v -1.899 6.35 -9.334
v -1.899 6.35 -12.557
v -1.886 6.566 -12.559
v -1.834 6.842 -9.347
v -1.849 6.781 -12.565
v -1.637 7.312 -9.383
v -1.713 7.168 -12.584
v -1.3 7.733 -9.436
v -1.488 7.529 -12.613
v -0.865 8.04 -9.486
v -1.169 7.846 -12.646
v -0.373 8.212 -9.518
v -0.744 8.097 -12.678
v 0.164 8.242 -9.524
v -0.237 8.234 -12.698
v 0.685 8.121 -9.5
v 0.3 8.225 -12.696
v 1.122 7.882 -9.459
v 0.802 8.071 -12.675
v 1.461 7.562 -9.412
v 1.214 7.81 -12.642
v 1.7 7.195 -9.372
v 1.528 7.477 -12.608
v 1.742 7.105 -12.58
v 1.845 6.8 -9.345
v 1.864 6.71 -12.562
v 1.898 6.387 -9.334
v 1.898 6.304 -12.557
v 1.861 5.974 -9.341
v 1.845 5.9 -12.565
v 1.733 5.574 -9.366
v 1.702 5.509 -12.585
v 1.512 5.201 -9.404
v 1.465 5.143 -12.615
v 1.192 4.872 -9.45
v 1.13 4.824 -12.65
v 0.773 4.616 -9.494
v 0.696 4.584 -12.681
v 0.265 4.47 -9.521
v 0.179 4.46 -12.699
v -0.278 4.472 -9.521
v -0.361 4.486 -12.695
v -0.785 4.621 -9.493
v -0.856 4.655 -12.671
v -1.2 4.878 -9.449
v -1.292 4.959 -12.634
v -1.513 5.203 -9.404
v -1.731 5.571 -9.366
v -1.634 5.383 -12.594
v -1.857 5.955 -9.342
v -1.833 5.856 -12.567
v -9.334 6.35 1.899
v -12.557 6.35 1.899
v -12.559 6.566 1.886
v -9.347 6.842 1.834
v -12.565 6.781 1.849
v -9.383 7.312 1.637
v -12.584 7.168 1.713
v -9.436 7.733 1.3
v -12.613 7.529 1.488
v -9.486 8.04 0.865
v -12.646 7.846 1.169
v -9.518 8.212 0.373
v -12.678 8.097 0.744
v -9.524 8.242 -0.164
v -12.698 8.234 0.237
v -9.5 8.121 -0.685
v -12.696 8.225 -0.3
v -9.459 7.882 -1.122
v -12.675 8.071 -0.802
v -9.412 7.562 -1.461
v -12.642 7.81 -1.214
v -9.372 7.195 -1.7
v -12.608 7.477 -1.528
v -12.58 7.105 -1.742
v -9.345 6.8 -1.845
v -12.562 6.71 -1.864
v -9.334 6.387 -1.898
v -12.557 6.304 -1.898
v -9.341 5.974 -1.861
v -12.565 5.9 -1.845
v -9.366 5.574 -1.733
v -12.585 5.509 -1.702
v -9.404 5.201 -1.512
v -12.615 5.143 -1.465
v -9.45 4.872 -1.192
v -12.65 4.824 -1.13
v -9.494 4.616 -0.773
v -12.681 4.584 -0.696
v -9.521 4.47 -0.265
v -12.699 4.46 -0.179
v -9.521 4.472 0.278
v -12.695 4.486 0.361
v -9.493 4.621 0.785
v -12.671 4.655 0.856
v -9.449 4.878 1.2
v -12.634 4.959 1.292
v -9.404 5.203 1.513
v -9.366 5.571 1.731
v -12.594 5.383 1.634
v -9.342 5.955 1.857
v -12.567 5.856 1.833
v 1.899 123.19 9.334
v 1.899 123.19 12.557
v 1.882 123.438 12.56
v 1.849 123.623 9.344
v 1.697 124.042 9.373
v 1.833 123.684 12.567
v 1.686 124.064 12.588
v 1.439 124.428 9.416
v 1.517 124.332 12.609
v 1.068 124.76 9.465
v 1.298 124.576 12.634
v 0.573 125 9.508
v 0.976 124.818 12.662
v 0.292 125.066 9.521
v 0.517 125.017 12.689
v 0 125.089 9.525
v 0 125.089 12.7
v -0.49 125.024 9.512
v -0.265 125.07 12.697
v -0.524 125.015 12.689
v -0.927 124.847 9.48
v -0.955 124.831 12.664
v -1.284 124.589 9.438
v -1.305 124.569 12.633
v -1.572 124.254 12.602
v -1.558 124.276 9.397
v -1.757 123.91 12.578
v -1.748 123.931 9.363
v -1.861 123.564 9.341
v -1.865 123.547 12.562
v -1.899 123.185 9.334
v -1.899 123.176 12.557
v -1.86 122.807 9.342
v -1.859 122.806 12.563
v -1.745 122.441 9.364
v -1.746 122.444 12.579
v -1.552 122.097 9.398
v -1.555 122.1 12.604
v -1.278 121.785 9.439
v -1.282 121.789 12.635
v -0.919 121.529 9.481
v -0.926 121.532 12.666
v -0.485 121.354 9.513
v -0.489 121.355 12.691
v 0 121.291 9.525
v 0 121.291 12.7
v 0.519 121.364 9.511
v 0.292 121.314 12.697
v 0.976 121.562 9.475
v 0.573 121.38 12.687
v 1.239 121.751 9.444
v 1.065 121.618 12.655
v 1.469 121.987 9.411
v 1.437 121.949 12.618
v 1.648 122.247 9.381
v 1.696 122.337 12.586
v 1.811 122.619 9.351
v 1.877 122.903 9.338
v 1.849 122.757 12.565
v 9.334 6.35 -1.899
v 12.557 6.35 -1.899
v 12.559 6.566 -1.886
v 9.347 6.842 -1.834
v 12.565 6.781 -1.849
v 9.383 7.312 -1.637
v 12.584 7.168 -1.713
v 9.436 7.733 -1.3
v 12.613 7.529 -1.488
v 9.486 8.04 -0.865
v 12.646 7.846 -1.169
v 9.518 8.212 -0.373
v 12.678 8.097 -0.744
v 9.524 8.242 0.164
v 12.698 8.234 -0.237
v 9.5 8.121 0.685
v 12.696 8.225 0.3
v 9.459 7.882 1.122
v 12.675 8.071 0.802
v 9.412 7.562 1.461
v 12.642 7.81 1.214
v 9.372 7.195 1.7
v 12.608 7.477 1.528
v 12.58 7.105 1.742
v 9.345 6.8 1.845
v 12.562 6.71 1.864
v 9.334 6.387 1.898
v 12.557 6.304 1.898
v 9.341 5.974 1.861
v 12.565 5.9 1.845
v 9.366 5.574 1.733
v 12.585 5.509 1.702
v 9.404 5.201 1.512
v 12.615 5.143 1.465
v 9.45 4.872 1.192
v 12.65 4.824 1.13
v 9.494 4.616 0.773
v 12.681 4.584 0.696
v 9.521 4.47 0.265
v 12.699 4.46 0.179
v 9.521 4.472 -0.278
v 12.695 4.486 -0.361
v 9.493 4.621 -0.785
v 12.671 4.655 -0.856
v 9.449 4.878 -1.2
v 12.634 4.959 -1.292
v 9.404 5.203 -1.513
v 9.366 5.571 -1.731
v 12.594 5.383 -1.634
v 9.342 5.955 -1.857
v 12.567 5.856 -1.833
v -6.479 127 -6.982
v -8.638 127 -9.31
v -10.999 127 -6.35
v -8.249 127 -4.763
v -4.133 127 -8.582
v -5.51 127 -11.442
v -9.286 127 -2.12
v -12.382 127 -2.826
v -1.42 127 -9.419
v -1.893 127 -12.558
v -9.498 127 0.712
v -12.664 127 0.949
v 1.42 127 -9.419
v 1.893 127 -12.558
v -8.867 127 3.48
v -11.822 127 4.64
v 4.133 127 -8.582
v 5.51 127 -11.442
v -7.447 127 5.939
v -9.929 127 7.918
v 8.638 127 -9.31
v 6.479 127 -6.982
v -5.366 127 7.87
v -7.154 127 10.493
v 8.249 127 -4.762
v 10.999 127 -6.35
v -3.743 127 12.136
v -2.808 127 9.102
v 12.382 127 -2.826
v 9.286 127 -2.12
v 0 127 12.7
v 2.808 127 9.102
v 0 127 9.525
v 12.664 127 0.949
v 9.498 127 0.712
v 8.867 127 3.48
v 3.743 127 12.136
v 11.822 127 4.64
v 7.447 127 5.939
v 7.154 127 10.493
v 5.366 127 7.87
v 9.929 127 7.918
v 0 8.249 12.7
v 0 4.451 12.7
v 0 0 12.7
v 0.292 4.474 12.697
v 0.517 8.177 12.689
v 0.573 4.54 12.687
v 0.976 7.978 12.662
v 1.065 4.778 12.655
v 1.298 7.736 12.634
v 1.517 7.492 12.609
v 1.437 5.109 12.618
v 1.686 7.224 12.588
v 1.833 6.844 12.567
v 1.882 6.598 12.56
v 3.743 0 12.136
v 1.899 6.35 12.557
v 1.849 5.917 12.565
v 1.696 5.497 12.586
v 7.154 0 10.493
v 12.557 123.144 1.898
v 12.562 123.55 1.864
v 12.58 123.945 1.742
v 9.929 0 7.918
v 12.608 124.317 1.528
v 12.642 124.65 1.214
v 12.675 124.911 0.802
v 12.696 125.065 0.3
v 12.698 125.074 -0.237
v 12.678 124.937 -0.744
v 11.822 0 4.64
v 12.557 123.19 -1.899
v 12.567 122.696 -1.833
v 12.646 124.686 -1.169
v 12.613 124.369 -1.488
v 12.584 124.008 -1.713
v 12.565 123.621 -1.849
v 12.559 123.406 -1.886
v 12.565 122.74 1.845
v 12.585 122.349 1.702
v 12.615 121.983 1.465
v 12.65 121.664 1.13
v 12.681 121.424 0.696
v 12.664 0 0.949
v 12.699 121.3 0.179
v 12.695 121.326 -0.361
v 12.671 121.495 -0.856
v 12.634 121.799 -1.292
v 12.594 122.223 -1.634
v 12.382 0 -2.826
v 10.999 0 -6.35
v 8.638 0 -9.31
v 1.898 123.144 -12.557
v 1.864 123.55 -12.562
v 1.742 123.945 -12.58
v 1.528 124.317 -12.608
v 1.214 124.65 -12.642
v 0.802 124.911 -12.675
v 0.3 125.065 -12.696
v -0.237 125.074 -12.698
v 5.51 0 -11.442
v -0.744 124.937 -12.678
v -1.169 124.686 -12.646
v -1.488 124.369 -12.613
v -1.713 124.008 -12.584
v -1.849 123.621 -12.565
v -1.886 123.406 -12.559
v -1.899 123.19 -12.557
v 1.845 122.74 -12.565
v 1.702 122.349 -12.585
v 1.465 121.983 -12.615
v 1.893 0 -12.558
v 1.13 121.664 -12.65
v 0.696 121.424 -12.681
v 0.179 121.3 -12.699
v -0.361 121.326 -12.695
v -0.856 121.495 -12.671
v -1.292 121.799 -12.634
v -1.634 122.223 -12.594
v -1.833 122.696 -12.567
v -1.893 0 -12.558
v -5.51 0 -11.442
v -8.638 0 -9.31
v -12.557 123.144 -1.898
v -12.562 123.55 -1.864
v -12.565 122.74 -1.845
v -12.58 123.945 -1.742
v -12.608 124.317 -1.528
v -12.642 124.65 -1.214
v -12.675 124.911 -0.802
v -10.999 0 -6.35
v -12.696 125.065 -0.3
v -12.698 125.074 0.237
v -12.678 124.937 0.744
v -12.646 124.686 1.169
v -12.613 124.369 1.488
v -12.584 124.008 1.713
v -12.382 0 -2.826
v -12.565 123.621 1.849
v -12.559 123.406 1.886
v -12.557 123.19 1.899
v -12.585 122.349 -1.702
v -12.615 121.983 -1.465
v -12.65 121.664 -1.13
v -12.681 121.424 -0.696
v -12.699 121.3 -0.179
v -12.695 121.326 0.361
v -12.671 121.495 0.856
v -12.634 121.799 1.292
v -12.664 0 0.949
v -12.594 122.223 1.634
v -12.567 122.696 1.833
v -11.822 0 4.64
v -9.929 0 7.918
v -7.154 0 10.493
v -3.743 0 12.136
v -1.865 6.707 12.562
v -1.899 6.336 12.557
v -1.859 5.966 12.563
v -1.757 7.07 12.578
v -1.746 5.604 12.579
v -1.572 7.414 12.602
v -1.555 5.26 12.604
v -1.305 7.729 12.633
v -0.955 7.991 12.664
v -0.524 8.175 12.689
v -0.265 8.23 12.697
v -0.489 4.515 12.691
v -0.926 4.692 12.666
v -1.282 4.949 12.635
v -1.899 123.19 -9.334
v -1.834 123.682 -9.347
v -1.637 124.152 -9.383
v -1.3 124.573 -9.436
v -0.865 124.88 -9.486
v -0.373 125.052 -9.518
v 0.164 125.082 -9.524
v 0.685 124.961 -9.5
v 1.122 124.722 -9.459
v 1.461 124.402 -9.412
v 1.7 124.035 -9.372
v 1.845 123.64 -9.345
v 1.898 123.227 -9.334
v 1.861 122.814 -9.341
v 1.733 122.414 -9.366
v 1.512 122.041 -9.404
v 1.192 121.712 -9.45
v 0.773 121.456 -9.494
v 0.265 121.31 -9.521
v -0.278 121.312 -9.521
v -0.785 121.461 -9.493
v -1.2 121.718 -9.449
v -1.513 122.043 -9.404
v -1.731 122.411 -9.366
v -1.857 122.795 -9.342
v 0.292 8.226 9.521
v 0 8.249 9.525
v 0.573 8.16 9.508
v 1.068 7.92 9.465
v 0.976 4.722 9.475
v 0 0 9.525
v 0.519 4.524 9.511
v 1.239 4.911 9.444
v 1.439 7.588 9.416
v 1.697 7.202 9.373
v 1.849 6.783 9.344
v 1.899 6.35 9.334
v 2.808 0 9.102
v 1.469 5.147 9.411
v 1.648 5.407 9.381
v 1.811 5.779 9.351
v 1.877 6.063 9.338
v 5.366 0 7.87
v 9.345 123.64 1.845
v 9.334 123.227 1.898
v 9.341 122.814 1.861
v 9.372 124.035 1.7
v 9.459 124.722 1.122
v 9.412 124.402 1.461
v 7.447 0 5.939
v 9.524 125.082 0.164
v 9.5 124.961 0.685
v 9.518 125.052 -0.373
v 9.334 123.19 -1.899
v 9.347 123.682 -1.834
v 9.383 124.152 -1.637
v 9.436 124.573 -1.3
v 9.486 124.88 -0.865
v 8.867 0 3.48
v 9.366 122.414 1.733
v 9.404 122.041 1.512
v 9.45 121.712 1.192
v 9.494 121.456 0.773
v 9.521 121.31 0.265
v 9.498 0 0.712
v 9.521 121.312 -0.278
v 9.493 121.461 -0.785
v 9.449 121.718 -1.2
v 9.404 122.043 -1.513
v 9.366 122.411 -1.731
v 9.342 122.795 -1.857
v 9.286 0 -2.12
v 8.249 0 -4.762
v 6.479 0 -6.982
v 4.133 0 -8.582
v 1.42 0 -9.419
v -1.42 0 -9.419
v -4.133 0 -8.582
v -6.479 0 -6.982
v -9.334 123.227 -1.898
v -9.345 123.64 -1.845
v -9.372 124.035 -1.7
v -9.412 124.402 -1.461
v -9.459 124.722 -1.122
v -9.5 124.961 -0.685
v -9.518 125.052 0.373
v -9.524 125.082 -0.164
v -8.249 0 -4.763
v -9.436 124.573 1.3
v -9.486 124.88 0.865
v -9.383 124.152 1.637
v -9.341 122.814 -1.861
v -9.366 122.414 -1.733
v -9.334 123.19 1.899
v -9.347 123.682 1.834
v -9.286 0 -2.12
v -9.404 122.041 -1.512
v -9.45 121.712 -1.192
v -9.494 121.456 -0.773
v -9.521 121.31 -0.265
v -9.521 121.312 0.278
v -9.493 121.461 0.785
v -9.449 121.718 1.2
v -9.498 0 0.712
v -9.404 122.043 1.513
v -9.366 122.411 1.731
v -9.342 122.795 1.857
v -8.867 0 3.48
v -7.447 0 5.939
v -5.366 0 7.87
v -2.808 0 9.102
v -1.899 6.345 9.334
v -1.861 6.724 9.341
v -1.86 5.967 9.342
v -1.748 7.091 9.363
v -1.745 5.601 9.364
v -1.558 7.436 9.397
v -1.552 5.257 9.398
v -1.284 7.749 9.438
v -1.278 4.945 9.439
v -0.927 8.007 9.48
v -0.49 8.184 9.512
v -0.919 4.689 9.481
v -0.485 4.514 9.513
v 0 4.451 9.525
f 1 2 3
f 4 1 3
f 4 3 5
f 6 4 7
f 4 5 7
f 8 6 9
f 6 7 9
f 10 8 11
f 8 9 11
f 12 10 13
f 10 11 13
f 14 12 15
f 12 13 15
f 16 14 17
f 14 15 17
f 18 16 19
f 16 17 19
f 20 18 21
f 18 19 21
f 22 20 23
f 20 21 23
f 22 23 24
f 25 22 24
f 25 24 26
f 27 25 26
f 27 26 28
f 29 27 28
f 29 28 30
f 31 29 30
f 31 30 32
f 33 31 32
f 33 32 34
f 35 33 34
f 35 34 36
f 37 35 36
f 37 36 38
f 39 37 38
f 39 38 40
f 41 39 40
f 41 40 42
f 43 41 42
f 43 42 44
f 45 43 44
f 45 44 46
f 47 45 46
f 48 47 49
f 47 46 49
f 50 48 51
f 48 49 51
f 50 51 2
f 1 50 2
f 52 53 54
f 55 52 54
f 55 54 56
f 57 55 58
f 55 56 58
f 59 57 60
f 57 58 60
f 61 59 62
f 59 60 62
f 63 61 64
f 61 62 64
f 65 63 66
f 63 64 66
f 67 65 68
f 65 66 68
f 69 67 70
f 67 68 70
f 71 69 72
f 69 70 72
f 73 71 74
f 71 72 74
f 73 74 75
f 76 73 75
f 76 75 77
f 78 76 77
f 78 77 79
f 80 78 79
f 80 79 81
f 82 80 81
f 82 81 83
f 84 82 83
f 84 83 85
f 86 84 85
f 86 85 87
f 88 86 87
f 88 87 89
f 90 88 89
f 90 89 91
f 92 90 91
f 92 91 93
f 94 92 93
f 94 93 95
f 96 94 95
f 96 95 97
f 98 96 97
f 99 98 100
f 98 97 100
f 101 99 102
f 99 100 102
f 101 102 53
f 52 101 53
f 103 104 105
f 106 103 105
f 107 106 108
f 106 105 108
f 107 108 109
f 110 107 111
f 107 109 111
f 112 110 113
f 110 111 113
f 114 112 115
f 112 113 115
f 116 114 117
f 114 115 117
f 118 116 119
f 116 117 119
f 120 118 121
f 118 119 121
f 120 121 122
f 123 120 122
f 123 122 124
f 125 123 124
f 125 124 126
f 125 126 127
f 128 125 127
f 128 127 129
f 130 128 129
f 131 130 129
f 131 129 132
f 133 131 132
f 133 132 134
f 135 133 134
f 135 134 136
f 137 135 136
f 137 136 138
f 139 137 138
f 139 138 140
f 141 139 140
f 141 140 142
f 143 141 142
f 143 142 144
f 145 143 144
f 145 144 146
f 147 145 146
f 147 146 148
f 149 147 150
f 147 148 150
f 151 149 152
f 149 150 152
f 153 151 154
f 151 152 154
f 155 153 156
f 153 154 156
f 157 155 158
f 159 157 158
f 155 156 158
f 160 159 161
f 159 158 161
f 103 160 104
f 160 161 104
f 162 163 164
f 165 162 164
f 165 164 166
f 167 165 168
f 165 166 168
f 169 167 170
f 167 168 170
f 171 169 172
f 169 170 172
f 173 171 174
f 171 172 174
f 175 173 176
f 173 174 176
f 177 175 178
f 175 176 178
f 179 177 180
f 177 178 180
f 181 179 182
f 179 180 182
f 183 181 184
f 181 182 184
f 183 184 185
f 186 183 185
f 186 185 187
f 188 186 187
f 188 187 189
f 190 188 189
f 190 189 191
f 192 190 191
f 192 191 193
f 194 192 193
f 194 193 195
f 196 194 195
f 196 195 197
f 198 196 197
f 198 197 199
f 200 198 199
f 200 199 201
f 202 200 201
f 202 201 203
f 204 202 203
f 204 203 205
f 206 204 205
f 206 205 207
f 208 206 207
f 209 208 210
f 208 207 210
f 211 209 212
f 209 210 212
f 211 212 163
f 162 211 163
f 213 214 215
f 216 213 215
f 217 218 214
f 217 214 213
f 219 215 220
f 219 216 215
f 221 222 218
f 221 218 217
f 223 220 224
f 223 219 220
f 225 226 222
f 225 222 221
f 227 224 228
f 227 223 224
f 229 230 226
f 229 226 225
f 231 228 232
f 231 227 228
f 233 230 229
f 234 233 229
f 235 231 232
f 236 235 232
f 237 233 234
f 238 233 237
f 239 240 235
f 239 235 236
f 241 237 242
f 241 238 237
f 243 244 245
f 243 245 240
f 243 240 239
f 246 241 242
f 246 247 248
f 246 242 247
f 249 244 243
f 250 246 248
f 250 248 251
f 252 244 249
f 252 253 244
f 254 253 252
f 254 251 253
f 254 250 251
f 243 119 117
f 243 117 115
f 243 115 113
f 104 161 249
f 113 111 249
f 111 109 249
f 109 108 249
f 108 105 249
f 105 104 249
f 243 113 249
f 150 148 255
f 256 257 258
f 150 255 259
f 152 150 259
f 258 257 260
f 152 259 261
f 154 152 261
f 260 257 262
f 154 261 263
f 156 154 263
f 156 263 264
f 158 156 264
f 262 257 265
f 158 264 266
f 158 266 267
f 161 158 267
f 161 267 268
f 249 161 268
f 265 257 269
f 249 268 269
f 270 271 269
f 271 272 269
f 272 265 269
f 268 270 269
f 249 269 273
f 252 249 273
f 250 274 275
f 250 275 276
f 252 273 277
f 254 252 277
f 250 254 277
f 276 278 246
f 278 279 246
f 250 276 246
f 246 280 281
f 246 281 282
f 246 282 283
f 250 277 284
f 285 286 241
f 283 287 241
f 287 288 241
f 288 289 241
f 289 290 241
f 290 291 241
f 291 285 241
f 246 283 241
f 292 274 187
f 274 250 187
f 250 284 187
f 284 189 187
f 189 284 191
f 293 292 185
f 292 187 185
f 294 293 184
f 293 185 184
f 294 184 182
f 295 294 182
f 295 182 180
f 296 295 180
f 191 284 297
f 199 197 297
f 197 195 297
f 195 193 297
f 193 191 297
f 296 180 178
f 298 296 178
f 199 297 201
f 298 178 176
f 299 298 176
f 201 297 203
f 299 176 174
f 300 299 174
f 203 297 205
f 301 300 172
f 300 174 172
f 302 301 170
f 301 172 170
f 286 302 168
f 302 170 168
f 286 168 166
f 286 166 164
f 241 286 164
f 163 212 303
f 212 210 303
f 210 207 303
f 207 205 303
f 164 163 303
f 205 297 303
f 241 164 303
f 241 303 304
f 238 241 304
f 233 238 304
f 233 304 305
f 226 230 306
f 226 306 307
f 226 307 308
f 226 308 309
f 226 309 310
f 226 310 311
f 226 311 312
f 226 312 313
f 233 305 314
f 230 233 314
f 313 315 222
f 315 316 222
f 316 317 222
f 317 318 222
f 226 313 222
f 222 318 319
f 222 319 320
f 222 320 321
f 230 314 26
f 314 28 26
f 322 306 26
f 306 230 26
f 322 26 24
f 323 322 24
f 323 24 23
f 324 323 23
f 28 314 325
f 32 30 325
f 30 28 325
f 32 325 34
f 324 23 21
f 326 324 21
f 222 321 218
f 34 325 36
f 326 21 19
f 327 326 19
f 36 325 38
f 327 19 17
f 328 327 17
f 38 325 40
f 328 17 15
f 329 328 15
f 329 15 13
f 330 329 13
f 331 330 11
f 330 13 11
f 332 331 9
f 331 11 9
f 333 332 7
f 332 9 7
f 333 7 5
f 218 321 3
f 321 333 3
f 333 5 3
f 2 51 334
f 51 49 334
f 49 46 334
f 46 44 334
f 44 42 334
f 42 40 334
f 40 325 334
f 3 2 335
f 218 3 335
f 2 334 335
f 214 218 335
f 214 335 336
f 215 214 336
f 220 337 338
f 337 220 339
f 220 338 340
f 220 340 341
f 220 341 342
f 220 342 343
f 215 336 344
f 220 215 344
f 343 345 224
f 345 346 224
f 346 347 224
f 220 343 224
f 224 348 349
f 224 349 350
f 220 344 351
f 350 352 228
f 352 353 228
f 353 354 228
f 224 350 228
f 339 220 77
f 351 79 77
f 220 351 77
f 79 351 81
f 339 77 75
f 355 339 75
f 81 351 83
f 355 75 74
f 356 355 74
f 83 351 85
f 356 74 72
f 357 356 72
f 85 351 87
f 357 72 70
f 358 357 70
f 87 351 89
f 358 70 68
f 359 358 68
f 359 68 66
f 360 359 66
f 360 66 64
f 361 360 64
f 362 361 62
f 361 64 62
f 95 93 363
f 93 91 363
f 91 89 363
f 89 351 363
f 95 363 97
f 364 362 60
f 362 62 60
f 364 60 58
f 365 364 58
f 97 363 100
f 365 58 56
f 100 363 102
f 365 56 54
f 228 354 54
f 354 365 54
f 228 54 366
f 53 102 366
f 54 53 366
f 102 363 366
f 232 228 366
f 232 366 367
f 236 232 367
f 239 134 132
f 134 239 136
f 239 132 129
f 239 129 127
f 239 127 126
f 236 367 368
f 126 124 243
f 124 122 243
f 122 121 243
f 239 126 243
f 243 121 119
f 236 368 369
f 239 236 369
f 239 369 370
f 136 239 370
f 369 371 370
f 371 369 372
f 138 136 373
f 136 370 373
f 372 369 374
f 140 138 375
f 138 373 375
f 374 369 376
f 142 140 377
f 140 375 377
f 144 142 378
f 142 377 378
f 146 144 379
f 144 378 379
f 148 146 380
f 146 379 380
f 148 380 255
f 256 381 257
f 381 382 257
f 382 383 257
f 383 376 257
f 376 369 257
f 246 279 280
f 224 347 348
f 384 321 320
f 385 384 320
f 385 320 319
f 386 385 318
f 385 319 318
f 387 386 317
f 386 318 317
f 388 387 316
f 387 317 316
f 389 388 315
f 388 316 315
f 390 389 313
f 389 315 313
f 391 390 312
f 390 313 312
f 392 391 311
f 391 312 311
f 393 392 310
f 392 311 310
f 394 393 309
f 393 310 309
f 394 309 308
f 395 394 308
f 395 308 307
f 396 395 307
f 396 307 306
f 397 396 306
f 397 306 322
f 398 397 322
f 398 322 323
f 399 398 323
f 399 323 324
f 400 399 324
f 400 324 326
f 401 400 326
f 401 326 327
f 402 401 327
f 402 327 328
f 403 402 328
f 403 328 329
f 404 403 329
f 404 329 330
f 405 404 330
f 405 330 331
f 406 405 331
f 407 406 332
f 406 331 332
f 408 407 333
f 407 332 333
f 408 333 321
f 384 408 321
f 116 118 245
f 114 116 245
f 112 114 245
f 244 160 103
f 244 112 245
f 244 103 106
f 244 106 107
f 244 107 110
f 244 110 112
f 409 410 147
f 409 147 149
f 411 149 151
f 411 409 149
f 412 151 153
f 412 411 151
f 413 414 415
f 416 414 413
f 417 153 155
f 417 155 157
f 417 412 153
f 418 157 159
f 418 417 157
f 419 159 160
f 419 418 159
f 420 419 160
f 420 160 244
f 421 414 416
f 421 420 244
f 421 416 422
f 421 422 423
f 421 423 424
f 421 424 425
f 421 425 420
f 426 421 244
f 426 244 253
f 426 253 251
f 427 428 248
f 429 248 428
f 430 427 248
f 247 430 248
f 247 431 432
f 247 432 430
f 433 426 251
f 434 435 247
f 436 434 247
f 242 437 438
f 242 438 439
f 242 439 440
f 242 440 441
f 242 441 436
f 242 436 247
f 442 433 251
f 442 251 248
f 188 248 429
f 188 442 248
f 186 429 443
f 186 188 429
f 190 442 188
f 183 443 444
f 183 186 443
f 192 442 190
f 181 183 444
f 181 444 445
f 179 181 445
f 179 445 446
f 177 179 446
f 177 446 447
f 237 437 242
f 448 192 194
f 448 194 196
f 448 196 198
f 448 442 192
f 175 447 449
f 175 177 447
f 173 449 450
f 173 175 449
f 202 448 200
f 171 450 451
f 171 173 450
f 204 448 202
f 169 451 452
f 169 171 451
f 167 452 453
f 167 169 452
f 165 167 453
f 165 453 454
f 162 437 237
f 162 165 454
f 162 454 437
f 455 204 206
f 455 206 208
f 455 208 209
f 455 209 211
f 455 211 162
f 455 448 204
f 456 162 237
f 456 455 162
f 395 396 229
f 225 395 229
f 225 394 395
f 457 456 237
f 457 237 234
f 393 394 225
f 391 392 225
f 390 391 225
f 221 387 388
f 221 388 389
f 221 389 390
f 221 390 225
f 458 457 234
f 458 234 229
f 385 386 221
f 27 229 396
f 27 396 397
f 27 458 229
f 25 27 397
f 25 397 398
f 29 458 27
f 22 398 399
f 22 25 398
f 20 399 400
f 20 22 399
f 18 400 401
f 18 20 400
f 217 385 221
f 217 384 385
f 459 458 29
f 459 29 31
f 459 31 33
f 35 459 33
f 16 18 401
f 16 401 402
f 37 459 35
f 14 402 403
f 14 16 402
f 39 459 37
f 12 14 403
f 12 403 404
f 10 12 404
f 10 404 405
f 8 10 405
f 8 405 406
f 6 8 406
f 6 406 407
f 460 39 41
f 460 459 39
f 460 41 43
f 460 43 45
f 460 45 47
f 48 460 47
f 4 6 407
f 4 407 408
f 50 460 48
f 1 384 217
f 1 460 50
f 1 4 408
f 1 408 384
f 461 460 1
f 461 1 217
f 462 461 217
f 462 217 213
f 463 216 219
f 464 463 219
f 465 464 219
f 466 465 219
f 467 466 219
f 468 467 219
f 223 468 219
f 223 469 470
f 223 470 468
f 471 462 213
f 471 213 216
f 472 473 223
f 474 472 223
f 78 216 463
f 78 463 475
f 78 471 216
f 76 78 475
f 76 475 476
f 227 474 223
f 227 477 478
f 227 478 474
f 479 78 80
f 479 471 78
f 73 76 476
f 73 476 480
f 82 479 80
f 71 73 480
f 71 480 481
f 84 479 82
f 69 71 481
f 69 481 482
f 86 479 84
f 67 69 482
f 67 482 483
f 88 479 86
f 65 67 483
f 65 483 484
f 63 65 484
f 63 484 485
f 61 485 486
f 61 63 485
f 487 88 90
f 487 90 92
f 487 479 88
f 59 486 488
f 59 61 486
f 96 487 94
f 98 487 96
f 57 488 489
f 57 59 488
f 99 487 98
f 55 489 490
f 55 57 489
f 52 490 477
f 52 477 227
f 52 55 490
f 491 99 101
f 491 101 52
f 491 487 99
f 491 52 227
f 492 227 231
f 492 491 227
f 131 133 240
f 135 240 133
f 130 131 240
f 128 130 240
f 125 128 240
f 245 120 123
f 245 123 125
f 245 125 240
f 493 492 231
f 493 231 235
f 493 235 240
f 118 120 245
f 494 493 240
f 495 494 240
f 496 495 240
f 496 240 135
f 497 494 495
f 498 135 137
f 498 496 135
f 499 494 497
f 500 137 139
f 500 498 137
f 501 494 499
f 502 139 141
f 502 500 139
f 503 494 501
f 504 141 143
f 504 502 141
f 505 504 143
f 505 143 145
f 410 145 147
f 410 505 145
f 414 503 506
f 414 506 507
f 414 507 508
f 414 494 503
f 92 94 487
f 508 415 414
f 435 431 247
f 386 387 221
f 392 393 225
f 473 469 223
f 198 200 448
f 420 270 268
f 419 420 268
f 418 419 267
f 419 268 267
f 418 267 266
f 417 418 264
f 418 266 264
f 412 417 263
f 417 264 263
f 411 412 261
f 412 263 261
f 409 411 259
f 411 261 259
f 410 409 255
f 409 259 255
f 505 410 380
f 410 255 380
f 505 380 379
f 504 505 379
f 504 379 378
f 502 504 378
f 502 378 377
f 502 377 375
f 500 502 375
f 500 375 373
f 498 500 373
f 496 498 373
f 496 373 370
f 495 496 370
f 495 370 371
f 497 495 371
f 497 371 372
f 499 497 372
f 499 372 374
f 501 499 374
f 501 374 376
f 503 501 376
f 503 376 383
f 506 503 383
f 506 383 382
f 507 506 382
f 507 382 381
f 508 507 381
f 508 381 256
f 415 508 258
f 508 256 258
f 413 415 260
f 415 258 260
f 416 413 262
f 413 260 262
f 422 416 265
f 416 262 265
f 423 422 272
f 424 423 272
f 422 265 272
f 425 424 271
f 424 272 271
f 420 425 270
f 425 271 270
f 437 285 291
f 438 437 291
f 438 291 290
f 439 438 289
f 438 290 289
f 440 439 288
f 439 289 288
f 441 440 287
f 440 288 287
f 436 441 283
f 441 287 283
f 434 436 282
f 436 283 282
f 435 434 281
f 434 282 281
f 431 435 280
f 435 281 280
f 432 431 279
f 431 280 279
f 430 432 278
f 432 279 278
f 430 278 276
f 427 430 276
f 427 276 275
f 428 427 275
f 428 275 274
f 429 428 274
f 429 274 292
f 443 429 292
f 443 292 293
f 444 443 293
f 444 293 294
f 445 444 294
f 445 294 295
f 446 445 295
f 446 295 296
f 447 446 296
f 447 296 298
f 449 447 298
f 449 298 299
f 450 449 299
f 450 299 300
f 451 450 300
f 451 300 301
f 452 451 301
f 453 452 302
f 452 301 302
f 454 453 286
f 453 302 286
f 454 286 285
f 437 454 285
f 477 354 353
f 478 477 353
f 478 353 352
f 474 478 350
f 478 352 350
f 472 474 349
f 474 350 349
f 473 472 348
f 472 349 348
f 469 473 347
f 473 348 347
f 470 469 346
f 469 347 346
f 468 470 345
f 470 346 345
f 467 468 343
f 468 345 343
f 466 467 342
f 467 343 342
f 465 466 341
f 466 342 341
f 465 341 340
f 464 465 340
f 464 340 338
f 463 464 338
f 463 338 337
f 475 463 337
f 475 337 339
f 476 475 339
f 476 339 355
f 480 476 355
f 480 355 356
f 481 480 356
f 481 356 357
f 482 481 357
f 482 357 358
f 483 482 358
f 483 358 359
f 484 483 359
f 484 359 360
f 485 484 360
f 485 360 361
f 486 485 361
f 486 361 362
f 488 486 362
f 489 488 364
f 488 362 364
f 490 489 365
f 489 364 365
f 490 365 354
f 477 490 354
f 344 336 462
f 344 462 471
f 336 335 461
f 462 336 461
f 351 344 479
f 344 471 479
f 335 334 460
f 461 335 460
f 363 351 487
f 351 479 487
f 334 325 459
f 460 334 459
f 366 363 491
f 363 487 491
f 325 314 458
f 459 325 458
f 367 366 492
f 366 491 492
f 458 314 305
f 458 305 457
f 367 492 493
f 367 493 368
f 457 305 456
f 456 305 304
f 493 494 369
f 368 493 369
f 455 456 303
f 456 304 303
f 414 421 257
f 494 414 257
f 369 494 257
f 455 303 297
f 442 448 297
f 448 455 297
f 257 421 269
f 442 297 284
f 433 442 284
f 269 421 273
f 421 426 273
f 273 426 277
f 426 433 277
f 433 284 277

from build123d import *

# Parameters (mm, degrees)
SKETCH1_R         = 12.7
SKETCH1_R_2       = 9.525
ELTUBO_DEPTH      = 127
SETSCREW_REACH    = 132.136
SETSCREW_BORE_R   = 1.89865
CIRPATTERN1_COUNT = 4


with BuildPart() as part:
    # Sketch1 → ElTubo (new body)
    with BuildSketch(Plane(origin=(0, 0, 0), x_dir=(1, 0, 0), z_dir=(0, 1, 0))):
        with Locations(Location((0, 0, 0), (0, 0, 270))):
            Circle(SKETCH1_R)
        with Locations(Location((0, 0, 0), (0, 0, 270))):
            Circle(SKETCH1_R_2, mode=Mode.SUBTRACT)
    extrude(amount=ELTUBO_DEPTH)

    # SetScrew bore → SetScrew (cut, up to next)
    with BuildSketch(Plane.ZY.offset(12.7), mode=Mode.PRIVATE) as setscrew_sk1:
        with Locations((0, 6.35)):
            Circle(SETSCREW_BORE_R)
    setscrew_tool1 = extrude(setscrew_sk1.sketch, amount=-SETSCREW_REACH, mode=Mode.PRIVATE) & part.part
    # SetScrew bore → SetScrew (cut, up to next)
    with BuildSketch(Plane.ZY.offset(12.7), mode=Mode.PRIVATE) as setscrew_sk2:
        with Locations((0, 123.19)):
            Circle(SETSCREW_BORE_R)
    setscrew_tool2 = extrude(setscrew_sk2.sketch, amount=-SETSCREW_REACH, mode=Mode.PRIVATE) & part.part
    setscrew_1 = setscrew_tool1.solids().sort_by_distance((-12.7, 6.35, 0))[0]
    add(setscrew_1, mode=Mode.SUBTRACT)
    setscrew_2 = setscrew_tool2.solids().sort_by_distance((-12.7, 123.19, 0))[0]
    add(setscrew_2, mode=Mode.SUBTRACT)
    setscrew = setscrew_1 + setscrew_2  # SetScrew as one shape, for the pattern or mirror that repeats it

    # CirPattern1: SetScrew ×4 about axis
    cirpattern1_axis = Axis((0, 127, 0), (0, -1, 0))
    for i in range(1, CIRPATTERN1_COUNT):
        add(setscrew.rotate(cirpattern1_axis, i * 360 / CIRPATTERN1_COUNT), mode=Mode.SUBTRACT)


solid = part.part
